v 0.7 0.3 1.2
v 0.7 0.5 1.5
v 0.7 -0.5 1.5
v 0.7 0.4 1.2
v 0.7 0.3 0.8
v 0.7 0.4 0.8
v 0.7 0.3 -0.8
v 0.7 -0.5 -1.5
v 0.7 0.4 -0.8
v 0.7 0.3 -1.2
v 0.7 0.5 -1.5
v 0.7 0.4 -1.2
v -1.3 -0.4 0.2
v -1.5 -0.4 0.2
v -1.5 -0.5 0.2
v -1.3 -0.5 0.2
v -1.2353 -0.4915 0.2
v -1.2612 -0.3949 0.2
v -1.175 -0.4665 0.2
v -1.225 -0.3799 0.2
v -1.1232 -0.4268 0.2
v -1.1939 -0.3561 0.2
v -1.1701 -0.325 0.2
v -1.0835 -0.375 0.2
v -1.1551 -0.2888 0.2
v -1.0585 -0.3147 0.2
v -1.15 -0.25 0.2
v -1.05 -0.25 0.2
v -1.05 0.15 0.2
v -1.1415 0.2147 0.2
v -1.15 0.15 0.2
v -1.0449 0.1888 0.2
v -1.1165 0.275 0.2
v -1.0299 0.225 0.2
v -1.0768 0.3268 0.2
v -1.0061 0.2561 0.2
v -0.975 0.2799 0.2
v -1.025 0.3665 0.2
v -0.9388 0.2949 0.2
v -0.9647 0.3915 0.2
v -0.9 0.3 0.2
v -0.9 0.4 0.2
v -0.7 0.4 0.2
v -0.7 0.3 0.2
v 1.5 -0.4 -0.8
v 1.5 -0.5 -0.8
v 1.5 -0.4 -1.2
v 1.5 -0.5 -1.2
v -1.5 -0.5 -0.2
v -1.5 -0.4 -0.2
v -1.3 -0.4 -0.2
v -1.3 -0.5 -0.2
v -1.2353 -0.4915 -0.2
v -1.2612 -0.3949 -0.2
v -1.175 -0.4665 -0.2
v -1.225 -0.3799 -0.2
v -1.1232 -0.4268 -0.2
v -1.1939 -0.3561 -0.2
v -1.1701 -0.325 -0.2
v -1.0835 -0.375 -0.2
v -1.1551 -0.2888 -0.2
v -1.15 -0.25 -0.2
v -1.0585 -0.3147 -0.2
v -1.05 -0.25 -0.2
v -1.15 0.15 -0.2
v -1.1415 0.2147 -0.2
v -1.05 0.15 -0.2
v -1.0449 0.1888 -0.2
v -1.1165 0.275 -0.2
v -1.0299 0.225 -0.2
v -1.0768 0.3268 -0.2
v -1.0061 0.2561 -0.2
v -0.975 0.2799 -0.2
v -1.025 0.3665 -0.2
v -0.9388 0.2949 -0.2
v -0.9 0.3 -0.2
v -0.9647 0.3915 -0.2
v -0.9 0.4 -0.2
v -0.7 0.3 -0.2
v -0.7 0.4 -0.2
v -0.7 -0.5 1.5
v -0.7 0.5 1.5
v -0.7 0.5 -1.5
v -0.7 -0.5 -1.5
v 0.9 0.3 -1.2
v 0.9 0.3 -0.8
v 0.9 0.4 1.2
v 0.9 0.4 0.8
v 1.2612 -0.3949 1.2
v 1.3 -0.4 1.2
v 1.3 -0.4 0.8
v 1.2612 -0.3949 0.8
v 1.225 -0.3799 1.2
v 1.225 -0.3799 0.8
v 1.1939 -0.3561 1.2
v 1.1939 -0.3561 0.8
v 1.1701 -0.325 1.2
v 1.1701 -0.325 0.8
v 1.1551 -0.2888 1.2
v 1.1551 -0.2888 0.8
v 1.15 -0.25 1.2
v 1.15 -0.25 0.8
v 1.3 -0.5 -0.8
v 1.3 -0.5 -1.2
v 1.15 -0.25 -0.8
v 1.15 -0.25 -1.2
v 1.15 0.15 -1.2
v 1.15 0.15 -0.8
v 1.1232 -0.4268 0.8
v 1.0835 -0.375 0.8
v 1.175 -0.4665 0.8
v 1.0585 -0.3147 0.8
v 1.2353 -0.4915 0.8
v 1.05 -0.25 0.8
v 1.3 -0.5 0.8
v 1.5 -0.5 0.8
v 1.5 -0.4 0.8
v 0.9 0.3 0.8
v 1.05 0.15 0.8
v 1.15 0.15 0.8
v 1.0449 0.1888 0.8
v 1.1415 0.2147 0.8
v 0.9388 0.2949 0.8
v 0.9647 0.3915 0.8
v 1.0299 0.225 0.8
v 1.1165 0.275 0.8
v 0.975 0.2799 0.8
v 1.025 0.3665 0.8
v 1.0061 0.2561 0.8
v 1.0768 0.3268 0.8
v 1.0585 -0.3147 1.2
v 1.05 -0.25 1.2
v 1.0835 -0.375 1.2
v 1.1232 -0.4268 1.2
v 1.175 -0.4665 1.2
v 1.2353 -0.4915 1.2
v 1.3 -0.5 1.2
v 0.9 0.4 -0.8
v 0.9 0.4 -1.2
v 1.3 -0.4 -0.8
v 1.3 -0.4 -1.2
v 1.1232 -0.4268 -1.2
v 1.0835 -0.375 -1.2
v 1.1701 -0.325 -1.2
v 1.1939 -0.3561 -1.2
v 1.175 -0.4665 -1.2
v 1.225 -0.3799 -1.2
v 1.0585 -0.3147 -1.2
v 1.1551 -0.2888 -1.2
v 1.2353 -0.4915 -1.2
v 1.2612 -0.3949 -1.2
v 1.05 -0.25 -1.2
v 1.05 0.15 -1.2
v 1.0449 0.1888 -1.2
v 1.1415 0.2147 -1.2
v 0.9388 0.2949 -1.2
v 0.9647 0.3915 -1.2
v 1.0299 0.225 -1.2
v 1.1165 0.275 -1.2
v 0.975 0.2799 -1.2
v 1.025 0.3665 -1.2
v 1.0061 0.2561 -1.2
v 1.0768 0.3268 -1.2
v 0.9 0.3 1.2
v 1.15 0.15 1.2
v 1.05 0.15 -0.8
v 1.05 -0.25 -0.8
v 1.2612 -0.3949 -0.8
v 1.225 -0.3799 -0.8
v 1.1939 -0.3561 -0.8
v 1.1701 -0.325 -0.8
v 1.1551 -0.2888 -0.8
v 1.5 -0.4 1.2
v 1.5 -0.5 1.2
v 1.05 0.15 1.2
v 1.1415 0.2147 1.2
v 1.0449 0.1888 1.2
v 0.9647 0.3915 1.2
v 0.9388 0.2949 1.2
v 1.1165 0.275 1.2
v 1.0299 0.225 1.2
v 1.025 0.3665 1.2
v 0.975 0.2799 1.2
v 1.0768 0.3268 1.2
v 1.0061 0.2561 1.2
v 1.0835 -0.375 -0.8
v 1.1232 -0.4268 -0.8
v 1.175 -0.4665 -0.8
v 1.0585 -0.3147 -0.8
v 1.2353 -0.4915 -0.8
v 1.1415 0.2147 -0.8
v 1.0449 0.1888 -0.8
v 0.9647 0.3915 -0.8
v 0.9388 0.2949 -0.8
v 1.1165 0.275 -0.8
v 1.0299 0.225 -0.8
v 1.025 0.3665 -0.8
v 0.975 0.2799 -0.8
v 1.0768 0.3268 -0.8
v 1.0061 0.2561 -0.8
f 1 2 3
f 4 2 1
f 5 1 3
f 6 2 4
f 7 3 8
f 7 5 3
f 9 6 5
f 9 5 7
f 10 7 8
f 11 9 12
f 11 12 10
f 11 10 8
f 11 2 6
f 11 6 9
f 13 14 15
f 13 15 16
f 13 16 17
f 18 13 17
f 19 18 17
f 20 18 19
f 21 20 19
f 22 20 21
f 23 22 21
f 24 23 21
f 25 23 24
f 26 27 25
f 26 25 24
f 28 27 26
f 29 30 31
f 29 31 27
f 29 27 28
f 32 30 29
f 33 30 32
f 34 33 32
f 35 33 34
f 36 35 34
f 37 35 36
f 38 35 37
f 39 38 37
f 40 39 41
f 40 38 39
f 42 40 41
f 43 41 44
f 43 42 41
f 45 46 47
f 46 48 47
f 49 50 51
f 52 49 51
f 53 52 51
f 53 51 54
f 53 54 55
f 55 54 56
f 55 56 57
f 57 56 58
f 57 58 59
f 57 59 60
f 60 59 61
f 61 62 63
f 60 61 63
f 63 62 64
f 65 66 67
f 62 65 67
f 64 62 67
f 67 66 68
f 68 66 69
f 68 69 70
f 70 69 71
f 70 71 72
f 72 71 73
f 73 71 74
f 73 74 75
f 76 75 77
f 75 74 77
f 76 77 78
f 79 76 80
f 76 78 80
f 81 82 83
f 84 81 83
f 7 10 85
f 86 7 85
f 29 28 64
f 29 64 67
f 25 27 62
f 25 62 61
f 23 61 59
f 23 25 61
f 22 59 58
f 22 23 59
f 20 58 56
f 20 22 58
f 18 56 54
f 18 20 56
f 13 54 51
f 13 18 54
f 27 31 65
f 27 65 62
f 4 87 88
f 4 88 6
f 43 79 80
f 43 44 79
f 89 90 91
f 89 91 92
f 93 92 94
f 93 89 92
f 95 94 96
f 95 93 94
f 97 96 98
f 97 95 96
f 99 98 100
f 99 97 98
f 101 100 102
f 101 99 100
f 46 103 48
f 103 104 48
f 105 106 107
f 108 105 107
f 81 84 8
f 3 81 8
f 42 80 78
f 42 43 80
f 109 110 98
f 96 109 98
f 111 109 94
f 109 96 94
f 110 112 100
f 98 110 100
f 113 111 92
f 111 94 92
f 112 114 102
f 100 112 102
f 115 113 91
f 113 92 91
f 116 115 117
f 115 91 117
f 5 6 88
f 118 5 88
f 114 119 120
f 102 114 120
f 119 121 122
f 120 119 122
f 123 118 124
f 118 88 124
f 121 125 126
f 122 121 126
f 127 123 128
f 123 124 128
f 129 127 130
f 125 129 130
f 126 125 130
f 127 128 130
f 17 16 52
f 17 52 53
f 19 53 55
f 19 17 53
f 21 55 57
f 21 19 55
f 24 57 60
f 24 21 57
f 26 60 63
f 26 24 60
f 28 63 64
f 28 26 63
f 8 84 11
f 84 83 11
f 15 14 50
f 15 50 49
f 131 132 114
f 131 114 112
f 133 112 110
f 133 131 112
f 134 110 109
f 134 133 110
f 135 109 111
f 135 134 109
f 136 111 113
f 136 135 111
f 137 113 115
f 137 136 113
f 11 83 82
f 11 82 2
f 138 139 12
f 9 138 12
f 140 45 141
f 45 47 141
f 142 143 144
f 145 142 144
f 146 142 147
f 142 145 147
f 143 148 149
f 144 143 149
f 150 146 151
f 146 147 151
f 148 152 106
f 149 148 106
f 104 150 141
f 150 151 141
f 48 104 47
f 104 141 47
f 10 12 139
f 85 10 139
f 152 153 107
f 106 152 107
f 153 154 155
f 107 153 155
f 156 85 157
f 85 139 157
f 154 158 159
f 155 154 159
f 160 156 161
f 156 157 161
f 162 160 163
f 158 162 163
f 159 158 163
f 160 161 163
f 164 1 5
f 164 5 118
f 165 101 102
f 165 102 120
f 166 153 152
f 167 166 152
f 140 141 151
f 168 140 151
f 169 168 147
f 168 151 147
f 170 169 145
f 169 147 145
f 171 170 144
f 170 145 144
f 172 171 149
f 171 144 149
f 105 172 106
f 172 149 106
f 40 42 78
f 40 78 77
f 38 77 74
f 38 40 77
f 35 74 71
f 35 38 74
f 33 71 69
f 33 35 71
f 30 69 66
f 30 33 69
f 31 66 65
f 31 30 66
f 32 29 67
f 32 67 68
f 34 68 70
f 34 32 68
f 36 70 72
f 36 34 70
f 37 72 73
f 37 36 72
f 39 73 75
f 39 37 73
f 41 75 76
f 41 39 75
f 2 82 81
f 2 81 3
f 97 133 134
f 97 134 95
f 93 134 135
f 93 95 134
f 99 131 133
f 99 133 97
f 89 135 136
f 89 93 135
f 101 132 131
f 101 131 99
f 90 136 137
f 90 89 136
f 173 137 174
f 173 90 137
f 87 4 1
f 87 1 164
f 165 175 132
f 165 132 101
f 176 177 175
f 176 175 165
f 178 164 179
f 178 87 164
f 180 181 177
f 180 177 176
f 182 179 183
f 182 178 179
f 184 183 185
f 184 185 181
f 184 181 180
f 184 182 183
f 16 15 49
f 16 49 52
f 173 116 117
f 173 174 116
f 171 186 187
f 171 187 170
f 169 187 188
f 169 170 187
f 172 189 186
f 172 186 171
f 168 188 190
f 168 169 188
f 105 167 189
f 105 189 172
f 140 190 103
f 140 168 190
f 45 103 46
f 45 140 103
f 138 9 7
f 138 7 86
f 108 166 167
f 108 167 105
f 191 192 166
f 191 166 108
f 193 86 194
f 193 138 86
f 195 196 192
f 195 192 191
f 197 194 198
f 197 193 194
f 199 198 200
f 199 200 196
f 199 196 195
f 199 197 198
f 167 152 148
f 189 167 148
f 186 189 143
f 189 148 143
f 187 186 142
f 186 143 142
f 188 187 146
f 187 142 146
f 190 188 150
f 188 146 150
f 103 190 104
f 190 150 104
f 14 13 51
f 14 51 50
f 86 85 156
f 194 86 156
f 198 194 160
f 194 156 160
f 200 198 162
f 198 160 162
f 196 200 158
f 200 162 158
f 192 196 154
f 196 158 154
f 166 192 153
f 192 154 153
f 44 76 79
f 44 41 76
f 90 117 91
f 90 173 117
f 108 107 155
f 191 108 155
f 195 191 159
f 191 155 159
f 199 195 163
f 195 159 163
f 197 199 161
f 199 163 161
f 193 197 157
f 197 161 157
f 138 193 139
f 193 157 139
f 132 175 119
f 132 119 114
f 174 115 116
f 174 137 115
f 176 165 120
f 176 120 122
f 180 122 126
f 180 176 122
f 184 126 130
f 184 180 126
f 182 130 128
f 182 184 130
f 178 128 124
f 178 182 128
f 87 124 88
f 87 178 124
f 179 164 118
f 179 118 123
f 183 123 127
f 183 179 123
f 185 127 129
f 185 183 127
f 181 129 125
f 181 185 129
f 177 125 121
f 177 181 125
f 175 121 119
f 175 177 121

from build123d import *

# Parameters (mm, degrees)
BASES_W      = 1.4
BASES_H      = 3
BASE_DEPTH   = 0.5
LEG_DEPTH    = 0.2
MIDLEG_DEPTH = 0.2


with BuildPart() as part:
    # BaseS → Base (new body, symmetric)
    with BuildSketch(Plane(origin=(0, 0, 0), x_dir=(1, 0, 0), z_dir=(0, 1, 0))):
        Rectangle(BASES_W, BASES_H)
    extrude(amount=BASE_DEPTH, both=True)

    # LegS → Leg (add, symmetric)
    with BuildSketch(Plane.XY.offset(1)):
        with BuildLine():
            Line((1.5, -0.4), (1.3, -0.4))
            ThreePointArc((1.3, -0.4), (1.193933983, -0.356066017), (1.15, -0.25))
            Line((1.15, -0.25), (1.15, 0.15))
            ThreePointArc((1.15, 0.15), (1.076776695, 0.326776695), (0.9, 0.4))
            Line((0.9, 0.4), (0.7, 0.4))
            Line((0.7, 0.4), (0.7, 0.3))
            Line((0.7, 0.3), (0.9, 0.3))
            ThreePointArc((0.9, 0.3), (1.006066017, 0.256066017), (1.05, 0.15))
            Line((1.05, 0.15), (1.05, -0.25))
            ThreePointArc((1.05, -0.25), (1.123223305, -0.426776695), (1.3, -0.5))
            Line((1.3, -0.5), (1.5, -0.5))
            Line((1.5, -0.5), (1.5, -0.4))
        make_face()
    leg = extrude(amount=LEG_DEPTH, both=True)

    # Mirror1: Leg across plane
    add(leg.mirror(Plane.XY))


with BuildPart() as body_2:
    # MidLegS → MidLeg (new body, symmetric)
    with BuildSketch(Plane.XY):
        with BuildLine():
            Line((-0.7, 0.4), (-0.9, 0.4))
            ThreePointArc((-0.9, 0.4), (-1.076776695, 0.326776695), (-1.15, 0.15))
            Line((-1.15, 0.15), (-1.15, -0.25))
            ThreePointArc((-1.15, -0.25), (-1.193933983, -0.356066017), (-1.3, -0.4))
            Line((-1.3, -0.4), (-1.5, -0.4))
            Line((-1.5, -0.4), (-1.5, -0.5))
            Line((-1.5, -0.5), (-1.3, -0.5))
            ThreePointArc((-1.3, -0.5), (-1.123223305, -0.426776695), (-1.05, -0.25))
            Line((-1.05, -0.25), (-1.05, 0.15))
            ThreePointArc((-1.05, 0.15), (-1.006066017, 0.256066017), (-0.9, 0.3))
            Line((-0.9, 0.3), (-0.7, 0.3))
            Line((-0.7, 0.3), (-0.7, 0.4))
        make_face()
    extrude(amount=MIDLEG_DEPTH, both=True)


solid = Compound([part.part, body_2.part])
